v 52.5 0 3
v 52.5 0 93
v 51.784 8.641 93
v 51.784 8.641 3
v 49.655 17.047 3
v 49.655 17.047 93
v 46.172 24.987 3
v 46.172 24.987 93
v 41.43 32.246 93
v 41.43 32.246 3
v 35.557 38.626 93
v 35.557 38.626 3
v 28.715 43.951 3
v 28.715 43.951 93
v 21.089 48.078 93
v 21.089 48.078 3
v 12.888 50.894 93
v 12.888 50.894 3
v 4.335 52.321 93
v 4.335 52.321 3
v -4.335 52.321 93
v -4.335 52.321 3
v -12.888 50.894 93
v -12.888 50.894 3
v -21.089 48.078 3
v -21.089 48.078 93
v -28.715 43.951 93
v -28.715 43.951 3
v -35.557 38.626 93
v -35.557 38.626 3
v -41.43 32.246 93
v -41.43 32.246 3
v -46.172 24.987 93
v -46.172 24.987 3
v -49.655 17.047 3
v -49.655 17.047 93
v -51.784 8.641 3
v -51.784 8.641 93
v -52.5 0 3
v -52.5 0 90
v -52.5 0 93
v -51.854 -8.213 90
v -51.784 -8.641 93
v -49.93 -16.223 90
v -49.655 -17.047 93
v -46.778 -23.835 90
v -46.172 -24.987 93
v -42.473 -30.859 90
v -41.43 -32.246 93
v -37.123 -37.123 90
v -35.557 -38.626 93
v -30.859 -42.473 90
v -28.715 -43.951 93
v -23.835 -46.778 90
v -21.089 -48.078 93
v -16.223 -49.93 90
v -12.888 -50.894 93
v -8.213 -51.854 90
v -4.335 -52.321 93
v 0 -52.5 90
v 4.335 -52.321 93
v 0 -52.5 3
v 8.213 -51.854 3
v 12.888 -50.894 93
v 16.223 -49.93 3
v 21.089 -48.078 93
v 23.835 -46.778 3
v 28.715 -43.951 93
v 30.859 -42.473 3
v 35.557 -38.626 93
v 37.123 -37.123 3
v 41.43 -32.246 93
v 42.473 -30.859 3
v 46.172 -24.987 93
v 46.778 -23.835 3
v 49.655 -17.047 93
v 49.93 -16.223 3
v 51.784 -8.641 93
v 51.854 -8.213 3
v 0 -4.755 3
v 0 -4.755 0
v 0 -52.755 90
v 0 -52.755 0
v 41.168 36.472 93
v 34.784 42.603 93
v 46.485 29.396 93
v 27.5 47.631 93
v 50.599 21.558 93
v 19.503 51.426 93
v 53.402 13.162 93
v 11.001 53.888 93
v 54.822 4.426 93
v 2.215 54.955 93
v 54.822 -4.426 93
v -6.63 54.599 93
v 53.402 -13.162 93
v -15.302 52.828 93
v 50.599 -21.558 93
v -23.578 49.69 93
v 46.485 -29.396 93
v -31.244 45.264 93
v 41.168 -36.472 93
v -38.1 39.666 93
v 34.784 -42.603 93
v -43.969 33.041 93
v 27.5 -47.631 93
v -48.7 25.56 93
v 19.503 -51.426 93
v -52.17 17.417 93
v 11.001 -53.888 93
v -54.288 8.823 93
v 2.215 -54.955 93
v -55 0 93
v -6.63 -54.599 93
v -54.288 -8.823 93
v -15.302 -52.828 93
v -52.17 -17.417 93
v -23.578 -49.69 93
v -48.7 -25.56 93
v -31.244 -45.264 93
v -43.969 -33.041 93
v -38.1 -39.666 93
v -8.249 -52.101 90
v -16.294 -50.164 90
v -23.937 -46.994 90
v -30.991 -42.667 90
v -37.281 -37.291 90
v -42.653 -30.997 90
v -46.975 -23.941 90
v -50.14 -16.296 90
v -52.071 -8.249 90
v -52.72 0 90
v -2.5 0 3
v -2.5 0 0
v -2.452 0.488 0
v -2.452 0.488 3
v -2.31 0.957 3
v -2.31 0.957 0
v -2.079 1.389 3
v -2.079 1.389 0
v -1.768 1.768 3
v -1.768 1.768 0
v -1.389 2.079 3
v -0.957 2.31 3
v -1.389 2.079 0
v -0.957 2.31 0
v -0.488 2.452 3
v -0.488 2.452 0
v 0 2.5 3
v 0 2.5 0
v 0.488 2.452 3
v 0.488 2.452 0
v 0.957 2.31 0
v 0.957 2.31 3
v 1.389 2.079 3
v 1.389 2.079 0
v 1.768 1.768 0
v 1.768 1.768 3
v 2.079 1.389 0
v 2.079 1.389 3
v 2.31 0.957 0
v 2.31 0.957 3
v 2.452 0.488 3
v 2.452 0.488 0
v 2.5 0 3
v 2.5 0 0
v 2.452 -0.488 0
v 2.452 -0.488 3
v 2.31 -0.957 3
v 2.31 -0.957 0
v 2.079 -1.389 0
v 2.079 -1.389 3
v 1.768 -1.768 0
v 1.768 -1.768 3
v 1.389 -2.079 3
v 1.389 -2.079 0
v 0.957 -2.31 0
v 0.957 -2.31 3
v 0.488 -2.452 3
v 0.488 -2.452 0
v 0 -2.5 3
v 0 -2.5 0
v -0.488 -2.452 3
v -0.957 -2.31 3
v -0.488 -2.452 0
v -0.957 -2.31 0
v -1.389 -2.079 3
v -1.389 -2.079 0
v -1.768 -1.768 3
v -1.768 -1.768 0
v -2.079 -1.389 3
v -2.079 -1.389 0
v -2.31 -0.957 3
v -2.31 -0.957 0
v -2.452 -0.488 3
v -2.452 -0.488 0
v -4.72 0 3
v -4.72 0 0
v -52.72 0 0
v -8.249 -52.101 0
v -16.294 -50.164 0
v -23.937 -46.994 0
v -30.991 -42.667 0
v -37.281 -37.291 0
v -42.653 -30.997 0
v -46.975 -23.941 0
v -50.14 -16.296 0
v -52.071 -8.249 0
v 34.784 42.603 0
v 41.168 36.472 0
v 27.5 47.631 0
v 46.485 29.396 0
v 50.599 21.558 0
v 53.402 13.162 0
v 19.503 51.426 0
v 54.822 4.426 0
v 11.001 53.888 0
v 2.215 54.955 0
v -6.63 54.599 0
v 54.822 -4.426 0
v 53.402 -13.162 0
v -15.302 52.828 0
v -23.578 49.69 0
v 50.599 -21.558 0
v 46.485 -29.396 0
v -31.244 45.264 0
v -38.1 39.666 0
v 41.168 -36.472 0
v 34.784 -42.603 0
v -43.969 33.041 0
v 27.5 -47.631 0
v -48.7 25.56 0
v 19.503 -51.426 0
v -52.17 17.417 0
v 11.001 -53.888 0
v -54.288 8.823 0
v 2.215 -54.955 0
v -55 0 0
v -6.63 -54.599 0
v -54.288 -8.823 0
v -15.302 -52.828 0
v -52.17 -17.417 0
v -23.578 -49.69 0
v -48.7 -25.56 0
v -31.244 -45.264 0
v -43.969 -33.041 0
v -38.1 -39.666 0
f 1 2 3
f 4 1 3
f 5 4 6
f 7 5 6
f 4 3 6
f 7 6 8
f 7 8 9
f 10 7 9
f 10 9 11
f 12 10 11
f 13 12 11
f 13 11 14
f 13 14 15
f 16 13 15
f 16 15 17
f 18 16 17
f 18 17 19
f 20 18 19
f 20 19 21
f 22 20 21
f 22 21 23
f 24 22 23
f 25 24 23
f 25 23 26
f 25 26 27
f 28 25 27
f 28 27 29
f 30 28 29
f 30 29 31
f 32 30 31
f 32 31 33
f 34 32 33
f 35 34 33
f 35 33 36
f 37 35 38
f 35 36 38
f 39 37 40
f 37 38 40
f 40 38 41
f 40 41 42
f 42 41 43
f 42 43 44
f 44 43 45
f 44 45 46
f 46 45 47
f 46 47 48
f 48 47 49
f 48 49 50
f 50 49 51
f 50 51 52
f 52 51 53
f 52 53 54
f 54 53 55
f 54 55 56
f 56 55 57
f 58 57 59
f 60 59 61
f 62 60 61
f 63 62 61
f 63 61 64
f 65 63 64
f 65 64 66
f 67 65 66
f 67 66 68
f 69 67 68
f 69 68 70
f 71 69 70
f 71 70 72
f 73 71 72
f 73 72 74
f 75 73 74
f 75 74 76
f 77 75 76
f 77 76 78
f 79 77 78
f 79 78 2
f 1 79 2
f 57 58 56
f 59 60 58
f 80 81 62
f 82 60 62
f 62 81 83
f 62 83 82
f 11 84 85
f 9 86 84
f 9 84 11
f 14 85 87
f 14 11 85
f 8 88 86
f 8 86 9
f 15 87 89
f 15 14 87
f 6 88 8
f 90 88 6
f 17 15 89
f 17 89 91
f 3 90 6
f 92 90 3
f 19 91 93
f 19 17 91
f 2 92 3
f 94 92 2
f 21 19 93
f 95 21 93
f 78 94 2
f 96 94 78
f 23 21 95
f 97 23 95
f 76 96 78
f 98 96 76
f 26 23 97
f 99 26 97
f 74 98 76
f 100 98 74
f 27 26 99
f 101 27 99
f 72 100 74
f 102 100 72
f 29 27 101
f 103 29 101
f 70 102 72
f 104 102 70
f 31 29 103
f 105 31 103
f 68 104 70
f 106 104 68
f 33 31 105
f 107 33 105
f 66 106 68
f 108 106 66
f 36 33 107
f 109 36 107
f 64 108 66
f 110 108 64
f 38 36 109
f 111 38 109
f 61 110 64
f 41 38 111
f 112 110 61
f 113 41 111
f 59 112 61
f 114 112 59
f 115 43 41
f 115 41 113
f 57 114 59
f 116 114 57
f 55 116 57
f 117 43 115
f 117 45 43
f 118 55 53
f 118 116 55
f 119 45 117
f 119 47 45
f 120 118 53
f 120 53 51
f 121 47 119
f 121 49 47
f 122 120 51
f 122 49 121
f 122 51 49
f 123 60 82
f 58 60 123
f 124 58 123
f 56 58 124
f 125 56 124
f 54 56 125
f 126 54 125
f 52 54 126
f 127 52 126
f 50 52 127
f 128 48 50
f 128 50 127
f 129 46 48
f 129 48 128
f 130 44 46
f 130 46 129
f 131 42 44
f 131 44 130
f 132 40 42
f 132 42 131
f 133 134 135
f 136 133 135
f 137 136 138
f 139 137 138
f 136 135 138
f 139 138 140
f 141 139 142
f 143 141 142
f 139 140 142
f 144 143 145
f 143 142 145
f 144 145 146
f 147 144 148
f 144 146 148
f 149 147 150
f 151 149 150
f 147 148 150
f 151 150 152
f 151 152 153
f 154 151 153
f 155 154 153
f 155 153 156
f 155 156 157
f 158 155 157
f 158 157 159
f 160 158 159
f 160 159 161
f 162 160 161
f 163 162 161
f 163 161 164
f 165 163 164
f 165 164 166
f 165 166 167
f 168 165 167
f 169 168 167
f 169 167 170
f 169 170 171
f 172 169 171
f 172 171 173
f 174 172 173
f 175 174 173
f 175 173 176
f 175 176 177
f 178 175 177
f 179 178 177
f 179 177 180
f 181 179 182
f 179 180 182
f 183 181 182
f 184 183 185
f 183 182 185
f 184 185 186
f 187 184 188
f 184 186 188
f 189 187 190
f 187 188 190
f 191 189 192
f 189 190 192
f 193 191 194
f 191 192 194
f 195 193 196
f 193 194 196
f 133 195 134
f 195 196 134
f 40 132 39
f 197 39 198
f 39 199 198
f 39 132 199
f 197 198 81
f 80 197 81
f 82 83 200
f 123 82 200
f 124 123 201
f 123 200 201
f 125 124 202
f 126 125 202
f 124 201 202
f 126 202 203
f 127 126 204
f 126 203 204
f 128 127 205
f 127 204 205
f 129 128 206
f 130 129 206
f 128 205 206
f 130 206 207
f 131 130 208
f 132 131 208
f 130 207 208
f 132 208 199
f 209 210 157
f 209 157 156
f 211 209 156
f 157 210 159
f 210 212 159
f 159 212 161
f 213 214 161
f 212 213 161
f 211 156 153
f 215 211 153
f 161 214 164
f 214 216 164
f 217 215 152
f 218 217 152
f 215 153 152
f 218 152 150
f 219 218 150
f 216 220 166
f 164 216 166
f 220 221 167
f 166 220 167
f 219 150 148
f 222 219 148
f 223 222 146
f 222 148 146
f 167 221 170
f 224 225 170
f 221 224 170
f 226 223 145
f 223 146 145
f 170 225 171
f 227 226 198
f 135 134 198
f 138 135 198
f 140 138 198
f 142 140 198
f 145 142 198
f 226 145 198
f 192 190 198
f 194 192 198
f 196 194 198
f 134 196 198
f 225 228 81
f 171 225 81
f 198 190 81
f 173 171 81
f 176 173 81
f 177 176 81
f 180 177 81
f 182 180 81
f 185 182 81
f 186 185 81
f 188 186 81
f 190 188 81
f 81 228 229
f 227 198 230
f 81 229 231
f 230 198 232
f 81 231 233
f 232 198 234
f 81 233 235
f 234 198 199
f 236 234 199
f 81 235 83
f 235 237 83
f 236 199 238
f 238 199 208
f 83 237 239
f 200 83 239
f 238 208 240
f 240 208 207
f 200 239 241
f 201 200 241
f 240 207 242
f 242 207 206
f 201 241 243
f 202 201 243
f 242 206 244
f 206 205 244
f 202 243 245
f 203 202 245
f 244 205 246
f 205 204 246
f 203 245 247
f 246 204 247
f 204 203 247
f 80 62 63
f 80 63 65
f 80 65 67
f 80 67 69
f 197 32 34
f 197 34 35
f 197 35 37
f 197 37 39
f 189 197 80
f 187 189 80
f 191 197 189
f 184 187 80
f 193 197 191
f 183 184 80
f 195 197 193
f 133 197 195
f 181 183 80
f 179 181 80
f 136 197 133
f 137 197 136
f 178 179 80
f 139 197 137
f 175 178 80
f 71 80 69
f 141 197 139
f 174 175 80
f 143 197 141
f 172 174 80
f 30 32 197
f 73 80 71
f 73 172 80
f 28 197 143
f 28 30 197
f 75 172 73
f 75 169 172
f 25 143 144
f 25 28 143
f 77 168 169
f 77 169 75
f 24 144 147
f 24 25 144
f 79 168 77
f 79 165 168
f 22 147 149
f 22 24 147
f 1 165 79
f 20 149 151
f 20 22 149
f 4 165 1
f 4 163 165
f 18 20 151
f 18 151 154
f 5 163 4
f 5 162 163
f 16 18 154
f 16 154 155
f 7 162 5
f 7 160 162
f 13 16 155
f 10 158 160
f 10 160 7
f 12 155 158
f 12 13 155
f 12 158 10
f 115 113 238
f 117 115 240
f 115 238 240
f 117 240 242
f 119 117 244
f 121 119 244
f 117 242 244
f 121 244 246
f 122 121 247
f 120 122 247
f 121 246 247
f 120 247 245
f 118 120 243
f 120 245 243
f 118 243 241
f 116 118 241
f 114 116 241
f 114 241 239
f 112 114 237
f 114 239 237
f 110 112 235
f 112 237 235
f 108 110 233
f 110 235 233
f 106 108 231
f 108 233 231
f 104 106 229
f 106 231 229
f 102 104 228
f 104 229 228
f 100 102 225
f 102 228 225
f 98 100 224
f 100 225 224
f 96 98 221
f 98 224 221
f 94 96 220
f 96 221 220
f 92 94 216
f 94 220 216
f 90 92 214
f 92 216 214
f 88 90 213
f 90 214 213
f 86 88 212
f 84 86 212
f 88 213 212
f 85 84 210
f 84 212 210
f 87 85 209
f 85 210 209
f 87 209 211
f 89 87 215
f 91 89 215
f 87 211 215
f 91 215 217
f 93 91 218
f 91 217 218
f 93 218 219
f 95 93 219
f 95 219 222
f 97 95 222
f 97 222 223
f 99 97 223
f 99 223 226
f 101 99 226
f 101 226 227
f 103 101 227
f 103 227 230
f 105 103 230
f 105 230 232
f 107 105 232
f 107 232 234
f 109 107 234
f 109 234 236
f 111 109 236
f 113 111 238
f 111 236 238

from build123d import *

# Parameters (mm, degrees)
SKICA1_R                 = 55
P_IDAT_VYSUNUT_M1_DEPTH  = 93
SKICA3_R                 = 52.5
ODEBRAT_VYSUNUT_M1_DEPTH = 90
SKICA5_R                 = 2.5
ODEBRAT_VYSUNUT_M5_DEPTH = 90


with BuildPart() as part:
    # Skica1 → Přidat vysunutím1 (new body)
    with BuildSketch(Plane.XY):
        with Locations(Location((0, 0, 0), (0, 0, 180))):
            Circle(SKICA1_R)
    extrude(amount=P_IDAT_VYSUNUT_M1_DEPTH)

    # Skica3 → Odebrat vysunutím1 (cut)
    with BuildSketch(Plane.XY.offset(93)):
        Circle(SKICA3_R)
    extrude(amount=-ODEBRAT_VYSUNUT_M1_DEPTH, mode=Mode.SUBTRACT)

    # Skica5 → Odebrat vysunutím5 (cut)
    with BuildSketch(Plane(origin=(0, 0, 0), x_dir=(-1, 0, 0), z_dir=(0, 0, -1))):
        Circle(SKICA5_R)
        with BuildLine():
            Line((0, -4.754963748), (0, -52.754963748))
            ThreePointArc((0, -52.754963748), (37.280920542, -37.291104979), (52.72020336, 0))
            Line((52.72020336, 0), (4.72020336, 0))
            Line((4.72020336, 0), (0, -4.754963748))
        make_face()
    extrude(amount=-ODEBRAT_VYSUNUT_M5_DEPTH, mode=Mode.SUBTRACT)


solid = part.part
